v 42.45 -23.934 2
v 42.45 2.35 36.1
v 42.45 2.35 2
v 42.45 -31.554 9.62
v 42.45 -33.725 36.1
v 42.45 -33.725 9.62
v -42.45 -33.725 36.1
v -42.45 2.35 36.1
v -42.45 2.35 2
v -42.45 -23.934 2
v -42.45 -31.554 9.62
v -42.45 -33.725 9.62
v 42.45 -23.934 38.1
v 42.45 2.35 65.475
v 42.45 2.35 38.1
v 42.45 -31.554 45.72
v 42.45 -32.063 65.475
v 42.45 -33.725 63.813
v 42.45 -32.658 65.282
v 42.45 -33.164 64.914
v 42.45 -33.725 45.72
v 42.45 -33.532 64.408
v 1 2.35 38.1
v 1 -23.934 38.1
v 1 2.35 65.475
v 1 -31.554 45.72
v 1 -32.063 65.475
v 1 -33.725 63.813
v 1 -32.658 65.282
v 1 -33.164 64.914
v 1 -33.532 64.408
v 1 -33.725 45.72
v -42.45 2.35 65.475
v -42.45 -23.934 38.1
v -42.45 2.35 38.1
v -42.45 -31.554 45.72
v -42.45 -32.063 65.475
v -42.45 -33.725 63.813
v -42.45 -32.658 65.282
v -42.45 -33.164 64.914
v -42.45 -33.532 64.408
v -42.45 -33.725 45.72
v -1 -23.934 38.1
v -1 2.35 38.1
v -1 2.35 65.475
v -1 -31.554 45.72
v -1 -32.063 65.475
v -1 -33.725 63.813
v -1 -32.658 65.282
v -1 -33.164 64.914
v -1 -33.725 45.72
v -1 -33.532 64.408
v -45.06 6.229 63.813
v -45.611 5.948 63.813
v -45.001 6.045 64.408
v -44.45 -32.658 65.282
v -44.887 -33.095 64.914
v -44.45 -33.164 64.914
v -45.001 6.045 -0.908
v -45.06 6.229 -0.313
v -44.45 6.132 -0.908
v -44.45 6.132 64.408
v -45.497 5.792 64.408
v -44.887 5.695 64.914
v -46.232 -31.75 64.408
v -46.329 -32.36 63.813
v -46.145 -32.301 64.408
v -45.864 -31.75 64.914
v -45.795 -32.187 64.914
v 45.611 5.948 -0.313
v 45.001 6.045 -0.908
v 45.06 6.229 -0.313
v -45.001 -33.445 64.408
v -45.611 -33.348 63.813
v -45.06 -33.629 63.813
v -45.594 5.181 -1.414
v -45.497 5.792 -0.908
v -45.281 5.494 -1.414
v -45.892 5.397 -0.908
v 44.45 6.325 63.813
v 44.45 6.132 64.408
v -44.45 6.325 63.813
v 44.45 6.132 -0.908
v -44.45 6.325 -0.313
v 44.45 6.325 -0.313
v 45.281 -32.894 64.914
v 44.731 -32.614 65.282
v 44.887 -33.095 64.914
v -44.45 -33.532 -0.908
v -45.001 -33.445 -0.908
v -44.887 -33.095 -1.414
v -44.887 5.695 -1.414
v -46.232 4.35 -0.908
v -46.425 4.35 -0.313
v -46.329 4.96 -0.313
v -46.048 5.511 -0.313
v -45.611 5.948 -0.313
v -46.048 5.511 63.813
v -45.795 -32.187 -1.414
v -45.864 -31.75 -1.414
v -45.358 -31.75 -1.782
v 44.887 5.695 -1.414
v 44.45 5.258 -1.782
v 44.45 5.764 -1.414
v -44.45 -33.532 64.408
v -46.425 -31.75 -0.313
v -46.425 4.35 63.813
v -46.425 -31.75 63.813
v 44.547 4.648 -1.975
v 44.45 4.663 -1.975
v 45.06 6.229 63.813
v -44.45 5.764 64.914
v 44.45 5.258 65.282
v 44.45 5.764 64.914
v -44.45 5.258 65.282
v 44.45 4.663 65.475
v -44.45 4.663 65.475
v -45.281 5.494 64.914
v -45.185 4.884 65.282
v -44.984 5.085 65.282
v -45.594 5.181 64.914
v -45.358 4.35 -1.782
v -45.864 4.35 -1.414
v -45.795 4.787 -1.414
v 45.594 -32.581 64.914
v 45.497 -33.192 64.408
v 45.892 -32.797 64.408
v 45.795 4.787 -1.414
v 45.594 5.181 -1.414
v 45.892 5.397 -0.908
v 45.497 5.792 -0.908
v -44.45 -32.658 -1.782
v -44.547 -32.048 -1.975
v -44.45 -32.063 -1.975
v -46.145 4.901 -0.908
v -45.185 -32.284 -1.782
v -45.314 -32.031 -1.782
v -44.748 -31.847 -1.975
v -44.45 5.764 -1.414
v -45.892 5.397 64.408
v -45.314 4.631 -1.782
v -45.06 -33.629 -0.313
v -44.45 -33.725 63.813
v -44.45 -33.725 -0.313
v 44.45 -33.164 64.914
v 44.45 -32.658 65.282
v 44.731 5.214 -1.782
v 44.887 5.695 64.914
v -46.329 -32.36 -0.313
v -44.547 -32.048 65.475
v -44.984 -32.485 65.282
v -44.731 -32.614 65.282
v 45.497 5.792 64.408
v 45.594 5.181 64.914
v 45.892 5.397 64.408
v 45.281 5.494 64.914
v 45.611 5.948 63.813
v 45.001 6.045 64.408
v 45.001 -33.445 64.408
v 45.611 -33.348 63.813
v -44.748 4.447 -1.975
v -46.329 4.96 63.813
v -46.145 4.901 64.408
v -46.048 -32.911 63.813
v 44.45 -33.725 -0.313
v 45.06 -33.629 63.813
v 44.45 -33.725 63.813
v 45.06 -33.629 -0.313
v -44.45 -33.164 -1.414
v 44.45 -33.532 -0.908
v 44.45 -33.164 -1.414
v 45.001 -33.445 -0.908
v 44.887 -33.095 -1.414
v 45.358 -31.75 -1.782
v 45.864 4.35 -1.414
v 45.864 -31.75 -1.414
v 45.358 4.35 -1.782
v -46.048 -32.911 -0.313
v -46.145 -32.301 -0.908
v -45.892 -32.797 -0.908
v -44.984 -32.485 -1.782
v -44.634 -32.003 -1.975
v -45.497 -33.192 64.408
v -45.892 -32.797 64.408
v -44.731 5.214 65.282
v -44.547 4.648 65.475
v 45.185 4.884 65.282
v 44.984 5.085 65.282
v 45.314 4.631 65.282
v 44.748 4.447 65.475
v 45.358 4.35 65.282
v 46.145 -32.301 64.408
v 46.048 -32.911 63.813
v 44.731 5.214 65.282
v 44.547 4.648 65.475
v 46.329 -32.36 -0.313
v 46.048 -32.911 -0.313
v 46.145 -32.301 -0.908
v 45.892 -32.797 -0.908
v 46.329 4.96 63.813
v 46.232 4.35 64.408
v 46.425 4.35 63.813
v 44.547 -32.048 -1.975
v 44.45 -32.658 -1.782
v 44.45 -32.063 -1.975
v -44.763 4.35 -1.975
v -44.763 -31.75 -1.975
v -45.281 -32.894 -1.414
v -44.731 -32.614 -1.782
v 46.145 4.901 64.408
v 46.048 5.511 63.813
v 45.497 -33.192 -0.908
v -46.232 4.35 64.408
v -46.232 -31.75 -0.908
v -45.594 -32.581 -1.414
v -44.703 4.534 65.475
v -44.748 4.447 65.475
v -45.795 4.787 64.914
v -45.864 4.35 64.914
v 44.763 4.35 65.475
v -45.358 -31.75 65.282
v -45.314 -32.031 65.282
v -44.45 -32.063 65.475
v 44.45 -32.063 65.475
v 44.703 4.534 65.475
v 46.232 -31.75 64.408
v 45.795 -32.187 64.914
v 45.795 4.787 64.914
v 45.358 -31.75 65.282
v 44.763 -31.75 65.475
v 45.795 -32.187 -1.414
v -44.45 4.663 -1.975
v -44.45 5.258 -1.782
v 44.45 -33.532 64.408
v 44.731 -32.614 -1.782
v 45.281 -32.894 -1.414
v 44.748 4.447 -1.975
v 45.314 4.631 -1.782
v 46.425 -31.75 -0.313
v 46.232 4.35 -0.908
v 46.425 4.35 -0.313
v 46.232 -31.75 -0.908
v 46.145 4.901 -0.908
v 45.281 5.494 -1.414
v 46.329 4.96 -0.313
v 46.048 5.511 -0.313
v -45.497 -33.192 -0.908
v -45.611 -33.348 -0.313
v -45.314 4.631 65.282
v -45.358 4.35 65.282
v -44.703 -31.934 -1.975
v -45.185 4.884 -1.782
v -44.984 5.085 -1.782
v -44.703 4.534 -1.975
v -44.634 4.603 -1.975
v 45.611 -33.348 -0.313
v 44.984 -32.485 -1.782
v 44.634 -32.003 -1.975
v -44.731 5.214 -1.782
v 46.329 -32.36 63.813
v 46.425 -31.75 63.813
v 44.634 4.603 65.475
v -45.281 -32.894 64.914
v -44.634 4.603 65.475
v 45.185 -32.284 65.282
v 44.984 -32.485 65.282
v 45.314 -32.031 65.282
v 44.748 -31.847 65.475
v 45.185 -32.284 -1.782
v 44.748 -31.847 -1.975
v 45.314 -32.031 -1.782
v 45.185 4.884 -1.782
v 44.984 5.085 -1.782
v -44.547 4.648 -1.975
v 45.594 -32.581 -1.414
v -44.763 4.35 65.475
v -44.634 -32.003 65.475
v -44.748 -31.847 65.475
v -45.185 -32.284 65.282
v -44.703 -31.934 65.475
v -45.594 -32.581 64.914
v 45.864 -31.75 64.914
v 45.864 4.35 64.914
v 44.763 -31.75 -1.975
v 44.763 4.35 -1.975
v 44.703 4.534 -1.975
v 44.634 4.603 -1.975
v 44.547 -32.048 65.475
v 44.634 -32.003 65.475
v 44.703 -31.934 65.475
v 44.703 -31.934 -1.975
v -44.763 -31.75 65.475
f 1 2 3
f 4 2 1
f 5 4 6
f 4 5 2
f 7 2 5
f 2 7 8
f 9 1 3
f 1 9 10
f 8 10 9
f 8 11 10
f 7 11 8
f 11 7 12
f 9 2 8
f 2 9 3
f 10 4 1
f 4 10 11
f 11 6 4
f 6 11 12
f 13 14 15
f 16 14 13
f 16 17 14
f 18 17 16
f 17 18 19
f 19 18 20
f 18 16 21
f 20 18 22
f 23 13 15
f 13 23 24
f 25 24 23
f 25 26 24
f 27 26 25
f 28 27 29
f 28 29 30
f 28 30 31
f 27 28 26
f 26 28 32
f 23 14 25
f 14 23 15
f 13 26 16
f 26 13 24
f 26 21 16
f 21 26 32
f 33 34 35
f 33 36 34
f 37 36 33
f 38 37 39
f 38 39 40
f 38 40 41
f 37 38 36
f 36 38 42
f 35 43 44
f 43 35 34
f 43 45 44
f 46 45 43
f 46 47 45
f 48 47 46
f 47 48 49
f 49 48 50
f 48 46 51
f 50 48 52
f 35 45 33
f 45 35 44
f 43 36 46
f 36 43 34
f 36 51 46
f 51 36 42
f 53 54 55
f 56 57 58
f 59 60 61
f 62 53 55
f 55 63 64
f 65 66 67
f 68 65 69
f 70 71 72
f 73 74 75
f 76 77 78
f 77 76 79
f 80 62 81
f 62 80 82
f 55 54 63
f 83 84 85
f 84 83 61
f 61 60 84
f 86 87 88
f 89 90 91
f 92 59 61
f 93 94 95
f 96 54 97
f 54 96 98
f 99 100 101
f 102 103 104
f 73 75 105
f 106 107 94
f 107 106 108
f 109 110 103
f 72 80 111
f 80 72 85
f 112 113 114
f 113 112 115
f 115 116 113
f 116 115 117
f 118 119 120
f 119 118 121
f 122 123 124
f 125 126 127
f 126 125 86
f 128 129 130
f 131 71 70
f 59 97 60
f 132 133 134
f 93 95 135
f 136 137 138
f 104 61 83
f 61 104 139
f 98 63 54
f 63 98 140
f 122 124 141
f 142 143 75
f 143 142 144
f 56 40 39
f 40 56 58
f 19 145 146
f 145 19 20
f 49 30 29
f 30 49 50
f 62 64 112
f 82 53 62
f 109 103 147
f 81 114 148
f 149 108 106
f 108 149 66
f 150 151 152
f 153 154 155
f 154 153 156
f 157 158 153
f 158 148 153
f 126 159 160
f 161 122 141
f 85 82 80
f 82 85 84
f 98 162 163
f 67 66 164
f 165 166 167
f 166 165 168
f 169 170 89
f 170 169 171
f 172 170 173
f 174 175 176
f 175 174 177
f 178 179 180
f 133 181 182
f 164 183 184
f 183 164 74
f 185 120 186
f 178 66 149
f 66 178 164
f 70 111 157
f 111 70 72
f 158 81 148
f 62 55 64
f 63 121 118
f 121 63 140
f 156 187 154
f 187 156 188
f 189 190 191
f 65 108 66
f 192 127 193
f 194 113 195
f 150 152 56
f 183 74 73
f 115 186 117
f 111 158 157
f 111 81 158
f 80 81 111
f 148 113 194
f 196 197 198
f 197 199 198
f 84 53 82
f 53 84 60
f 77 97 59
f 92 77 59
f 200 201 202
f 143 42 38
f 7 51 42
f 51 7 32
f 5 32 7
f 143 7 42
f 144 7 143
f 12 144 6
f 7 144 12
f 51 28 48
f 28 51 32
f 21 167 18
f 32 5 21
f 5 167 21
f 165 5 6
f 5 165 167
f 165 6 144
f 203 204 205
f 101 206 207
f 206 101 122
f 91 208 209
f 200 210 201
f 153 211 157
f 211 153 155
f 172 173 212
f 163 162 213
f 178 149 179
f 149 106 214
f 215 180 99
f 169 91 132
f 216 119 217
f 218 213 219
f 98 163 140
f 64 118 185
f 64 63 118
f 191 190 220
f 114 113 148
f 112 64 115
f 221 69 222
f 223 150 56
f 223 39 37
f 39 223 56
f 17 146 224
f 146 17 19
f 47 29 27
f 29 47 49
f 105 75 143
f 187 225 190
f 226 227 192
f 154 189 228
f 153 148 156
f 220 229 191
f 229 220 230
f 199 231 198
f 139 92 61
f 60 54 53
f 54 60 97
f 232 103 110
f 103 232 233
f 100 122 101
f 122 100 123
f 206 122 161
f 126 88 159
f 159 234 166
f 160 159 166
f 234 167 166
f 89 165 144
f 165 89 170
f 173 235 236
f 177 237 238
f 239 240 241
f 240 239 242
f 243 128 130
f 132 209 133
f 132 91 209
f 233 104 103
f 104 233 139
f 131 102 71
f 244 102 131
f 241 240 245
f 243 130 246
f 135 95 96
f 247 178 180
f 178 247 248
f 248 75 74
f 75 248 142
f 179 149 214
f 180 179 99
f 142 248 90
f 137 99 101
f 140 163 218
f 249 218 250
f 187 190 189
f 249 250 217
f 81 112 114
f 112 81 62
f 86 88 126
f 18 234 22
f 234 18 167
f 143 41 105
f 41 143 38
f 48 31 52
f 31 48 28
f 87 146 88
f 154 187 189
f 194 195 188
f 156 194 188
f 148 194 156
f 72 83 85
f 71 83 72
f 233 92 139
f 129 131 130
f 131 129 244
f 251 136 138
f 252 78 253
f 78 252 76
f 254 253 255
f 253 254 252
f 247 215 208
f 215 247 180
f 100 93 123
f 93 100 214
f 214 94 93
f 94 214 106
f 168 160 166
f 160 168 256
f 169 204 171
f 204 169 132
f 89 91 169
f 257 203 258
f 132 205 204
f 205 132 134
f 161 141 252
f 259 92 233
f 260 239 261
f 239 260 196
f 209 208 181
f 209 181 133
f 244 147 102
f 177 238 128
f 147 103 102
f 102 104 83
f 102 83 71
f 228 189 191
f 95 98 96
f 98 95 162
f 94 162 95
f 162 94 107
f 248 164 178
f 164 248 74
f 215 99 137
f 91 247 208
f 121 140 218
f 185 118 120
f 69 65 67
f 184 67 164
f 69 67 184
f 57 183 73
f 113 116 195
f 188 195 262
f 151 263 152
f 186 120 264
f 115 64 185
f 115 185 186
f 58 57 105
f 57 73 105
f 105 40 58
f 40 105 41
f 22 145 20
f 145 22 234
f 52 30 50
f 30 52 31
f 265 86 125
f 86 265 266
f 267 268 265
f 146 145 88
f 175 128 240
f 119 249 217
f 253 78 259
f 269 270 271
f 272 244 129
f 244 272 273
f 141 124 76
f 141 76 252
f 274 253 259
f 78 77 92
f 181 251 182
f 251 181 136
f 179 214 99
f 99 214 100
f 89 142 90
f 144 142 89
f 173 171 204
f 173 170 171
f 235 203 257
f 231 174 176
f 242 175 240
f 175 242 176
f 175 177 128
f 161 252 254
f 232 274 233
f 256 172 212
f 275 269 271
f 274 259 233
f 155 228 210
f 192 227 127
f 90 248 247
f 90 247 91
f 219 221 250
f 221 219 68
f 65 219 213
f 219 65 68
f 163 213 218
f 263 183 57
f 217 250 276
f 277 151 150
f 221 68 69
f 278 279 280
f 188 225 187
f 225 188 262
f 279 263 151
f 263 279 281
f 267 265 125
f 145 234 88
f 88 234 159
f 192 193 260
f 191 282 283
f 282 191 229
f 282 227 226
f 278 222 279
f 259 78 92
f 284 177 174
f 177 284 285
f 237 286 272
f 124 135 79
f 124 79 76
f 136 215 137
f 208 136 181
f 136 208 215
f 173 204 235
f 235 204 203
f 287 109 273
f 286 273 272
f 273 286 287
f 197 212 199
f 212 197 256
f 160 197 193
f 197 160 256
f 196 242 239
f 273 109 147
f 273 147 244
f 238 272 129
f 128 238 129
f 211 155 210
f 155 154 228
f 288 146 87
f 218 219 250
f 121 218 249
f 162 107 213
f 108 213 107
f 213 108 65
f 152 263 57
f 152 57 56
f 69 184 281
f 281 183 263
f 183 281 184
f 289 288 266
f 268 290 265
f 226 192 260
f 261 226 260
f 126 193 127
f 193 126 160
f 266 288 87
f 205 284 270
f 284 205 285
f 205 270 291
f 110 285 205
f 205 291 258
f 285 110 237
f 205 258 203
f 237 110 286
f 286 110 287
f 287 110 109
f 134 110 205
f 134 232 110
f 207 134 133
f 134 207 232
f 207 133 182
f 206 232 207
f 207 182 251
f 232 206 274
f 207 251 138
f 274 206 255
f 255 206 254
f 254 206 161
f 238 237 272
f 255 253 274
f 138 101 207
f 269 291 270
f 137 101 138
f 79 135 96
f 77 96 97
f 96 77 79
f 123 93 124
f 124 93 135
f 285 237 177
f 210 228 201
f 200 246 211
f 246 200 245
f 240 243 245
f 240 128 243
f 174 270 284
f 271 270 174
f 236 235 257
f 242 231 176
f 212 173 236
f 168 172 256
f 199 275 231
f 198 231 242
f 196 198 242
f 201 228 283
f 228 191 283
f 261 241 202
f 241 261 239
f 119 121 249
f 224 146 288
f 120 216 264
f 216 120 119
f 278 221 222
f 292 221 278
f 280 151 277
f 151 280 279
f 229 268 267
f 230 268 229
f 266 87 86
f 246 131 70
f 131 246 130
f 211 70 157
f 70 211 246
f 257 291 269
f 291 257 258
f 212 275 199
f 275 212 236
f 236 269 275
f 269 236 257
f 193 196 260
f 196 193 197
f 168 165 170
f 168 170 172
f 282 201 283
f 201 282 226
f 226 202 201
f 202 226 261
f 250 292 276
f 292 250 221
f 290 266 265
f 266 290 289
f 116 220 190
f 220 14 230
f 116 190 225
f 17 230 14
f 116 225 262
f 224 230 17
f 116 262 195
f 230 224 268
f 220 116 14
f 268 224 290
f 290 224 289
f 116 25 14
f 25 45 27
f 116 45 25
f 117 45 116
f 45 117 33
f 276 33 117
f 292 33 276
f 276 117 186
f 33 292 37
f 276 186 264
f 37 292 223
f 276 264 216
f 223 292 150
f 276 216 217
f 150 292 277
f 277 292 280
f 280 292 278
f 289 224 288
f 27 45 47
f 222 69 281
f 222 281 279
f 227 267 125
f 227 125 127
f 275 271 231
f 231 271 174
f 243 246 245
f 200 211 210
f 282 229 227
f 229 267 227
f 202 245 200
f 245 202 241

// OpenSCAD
inch=25.4;
round=2;
thick=2;
module shell()
{
    minkowski()
    {
        translate([0,-(inch+thick)/2,2.5/2*inch])cube([3.5*inch,1.5*inch-thick,2.5*inch],center=true);
        sphere(r=round,$fn=20);
    }
}
module reserve()
{
    xx=(3.5*inch)-thick*2;
    yy=(1.5*inch)-thick*2;
    zz=(1.5*inch)-thick*2;
    translate([0,-(2.5*inch)/2+yy/2,0])difference()
    {
        translate([0,0,zz/2+thick])cube([xx,yy,zz],center=true);
        rotate([-45,0,0])translate([0,0,-zz/2])cube([xx+1,2*yy,zz*.7],center=true);
    }
    translate([0,-(2.5*inch)/2+yy/2-thick*2,0])translate([0,0,zz/2+thick+.15*inch])cube([xx,yy,zz-.3*inch],center=true);
}
module pool()
{
    xx=((3.5*inch)-thick*2)/2-thick/2;
    yy=(1.5*inch)-thick*2;
    zz=(1.5*inch)-thick*2;
    translate([xx/2+thick/2,0,0]){
    translate([0,-(2.5*inch)/2+yy/2,0])difference()
    {
        translate([0,0,zz/2+thick])cube([xx,yy,zz],center=true);
        rotate([-45,0,0])translate([0,0,-zz/2])cube([xx+1,2*yy,zz*.7],center=true);
    }
    translate([0,-(2.5*inch)/2+yy/2-thick*2,0])translate([0,0,zz/2+thick+.15*inch])cube([xx,yy,zz-.3*inch],center=true);}
}

difference()
{
    shell();
    reserve();
    translate([0,0,(1.5*inch-thick)])pool();
    mirror([1,0,0])translate([0,0,(1.5*inch-thick)])pool();
}
